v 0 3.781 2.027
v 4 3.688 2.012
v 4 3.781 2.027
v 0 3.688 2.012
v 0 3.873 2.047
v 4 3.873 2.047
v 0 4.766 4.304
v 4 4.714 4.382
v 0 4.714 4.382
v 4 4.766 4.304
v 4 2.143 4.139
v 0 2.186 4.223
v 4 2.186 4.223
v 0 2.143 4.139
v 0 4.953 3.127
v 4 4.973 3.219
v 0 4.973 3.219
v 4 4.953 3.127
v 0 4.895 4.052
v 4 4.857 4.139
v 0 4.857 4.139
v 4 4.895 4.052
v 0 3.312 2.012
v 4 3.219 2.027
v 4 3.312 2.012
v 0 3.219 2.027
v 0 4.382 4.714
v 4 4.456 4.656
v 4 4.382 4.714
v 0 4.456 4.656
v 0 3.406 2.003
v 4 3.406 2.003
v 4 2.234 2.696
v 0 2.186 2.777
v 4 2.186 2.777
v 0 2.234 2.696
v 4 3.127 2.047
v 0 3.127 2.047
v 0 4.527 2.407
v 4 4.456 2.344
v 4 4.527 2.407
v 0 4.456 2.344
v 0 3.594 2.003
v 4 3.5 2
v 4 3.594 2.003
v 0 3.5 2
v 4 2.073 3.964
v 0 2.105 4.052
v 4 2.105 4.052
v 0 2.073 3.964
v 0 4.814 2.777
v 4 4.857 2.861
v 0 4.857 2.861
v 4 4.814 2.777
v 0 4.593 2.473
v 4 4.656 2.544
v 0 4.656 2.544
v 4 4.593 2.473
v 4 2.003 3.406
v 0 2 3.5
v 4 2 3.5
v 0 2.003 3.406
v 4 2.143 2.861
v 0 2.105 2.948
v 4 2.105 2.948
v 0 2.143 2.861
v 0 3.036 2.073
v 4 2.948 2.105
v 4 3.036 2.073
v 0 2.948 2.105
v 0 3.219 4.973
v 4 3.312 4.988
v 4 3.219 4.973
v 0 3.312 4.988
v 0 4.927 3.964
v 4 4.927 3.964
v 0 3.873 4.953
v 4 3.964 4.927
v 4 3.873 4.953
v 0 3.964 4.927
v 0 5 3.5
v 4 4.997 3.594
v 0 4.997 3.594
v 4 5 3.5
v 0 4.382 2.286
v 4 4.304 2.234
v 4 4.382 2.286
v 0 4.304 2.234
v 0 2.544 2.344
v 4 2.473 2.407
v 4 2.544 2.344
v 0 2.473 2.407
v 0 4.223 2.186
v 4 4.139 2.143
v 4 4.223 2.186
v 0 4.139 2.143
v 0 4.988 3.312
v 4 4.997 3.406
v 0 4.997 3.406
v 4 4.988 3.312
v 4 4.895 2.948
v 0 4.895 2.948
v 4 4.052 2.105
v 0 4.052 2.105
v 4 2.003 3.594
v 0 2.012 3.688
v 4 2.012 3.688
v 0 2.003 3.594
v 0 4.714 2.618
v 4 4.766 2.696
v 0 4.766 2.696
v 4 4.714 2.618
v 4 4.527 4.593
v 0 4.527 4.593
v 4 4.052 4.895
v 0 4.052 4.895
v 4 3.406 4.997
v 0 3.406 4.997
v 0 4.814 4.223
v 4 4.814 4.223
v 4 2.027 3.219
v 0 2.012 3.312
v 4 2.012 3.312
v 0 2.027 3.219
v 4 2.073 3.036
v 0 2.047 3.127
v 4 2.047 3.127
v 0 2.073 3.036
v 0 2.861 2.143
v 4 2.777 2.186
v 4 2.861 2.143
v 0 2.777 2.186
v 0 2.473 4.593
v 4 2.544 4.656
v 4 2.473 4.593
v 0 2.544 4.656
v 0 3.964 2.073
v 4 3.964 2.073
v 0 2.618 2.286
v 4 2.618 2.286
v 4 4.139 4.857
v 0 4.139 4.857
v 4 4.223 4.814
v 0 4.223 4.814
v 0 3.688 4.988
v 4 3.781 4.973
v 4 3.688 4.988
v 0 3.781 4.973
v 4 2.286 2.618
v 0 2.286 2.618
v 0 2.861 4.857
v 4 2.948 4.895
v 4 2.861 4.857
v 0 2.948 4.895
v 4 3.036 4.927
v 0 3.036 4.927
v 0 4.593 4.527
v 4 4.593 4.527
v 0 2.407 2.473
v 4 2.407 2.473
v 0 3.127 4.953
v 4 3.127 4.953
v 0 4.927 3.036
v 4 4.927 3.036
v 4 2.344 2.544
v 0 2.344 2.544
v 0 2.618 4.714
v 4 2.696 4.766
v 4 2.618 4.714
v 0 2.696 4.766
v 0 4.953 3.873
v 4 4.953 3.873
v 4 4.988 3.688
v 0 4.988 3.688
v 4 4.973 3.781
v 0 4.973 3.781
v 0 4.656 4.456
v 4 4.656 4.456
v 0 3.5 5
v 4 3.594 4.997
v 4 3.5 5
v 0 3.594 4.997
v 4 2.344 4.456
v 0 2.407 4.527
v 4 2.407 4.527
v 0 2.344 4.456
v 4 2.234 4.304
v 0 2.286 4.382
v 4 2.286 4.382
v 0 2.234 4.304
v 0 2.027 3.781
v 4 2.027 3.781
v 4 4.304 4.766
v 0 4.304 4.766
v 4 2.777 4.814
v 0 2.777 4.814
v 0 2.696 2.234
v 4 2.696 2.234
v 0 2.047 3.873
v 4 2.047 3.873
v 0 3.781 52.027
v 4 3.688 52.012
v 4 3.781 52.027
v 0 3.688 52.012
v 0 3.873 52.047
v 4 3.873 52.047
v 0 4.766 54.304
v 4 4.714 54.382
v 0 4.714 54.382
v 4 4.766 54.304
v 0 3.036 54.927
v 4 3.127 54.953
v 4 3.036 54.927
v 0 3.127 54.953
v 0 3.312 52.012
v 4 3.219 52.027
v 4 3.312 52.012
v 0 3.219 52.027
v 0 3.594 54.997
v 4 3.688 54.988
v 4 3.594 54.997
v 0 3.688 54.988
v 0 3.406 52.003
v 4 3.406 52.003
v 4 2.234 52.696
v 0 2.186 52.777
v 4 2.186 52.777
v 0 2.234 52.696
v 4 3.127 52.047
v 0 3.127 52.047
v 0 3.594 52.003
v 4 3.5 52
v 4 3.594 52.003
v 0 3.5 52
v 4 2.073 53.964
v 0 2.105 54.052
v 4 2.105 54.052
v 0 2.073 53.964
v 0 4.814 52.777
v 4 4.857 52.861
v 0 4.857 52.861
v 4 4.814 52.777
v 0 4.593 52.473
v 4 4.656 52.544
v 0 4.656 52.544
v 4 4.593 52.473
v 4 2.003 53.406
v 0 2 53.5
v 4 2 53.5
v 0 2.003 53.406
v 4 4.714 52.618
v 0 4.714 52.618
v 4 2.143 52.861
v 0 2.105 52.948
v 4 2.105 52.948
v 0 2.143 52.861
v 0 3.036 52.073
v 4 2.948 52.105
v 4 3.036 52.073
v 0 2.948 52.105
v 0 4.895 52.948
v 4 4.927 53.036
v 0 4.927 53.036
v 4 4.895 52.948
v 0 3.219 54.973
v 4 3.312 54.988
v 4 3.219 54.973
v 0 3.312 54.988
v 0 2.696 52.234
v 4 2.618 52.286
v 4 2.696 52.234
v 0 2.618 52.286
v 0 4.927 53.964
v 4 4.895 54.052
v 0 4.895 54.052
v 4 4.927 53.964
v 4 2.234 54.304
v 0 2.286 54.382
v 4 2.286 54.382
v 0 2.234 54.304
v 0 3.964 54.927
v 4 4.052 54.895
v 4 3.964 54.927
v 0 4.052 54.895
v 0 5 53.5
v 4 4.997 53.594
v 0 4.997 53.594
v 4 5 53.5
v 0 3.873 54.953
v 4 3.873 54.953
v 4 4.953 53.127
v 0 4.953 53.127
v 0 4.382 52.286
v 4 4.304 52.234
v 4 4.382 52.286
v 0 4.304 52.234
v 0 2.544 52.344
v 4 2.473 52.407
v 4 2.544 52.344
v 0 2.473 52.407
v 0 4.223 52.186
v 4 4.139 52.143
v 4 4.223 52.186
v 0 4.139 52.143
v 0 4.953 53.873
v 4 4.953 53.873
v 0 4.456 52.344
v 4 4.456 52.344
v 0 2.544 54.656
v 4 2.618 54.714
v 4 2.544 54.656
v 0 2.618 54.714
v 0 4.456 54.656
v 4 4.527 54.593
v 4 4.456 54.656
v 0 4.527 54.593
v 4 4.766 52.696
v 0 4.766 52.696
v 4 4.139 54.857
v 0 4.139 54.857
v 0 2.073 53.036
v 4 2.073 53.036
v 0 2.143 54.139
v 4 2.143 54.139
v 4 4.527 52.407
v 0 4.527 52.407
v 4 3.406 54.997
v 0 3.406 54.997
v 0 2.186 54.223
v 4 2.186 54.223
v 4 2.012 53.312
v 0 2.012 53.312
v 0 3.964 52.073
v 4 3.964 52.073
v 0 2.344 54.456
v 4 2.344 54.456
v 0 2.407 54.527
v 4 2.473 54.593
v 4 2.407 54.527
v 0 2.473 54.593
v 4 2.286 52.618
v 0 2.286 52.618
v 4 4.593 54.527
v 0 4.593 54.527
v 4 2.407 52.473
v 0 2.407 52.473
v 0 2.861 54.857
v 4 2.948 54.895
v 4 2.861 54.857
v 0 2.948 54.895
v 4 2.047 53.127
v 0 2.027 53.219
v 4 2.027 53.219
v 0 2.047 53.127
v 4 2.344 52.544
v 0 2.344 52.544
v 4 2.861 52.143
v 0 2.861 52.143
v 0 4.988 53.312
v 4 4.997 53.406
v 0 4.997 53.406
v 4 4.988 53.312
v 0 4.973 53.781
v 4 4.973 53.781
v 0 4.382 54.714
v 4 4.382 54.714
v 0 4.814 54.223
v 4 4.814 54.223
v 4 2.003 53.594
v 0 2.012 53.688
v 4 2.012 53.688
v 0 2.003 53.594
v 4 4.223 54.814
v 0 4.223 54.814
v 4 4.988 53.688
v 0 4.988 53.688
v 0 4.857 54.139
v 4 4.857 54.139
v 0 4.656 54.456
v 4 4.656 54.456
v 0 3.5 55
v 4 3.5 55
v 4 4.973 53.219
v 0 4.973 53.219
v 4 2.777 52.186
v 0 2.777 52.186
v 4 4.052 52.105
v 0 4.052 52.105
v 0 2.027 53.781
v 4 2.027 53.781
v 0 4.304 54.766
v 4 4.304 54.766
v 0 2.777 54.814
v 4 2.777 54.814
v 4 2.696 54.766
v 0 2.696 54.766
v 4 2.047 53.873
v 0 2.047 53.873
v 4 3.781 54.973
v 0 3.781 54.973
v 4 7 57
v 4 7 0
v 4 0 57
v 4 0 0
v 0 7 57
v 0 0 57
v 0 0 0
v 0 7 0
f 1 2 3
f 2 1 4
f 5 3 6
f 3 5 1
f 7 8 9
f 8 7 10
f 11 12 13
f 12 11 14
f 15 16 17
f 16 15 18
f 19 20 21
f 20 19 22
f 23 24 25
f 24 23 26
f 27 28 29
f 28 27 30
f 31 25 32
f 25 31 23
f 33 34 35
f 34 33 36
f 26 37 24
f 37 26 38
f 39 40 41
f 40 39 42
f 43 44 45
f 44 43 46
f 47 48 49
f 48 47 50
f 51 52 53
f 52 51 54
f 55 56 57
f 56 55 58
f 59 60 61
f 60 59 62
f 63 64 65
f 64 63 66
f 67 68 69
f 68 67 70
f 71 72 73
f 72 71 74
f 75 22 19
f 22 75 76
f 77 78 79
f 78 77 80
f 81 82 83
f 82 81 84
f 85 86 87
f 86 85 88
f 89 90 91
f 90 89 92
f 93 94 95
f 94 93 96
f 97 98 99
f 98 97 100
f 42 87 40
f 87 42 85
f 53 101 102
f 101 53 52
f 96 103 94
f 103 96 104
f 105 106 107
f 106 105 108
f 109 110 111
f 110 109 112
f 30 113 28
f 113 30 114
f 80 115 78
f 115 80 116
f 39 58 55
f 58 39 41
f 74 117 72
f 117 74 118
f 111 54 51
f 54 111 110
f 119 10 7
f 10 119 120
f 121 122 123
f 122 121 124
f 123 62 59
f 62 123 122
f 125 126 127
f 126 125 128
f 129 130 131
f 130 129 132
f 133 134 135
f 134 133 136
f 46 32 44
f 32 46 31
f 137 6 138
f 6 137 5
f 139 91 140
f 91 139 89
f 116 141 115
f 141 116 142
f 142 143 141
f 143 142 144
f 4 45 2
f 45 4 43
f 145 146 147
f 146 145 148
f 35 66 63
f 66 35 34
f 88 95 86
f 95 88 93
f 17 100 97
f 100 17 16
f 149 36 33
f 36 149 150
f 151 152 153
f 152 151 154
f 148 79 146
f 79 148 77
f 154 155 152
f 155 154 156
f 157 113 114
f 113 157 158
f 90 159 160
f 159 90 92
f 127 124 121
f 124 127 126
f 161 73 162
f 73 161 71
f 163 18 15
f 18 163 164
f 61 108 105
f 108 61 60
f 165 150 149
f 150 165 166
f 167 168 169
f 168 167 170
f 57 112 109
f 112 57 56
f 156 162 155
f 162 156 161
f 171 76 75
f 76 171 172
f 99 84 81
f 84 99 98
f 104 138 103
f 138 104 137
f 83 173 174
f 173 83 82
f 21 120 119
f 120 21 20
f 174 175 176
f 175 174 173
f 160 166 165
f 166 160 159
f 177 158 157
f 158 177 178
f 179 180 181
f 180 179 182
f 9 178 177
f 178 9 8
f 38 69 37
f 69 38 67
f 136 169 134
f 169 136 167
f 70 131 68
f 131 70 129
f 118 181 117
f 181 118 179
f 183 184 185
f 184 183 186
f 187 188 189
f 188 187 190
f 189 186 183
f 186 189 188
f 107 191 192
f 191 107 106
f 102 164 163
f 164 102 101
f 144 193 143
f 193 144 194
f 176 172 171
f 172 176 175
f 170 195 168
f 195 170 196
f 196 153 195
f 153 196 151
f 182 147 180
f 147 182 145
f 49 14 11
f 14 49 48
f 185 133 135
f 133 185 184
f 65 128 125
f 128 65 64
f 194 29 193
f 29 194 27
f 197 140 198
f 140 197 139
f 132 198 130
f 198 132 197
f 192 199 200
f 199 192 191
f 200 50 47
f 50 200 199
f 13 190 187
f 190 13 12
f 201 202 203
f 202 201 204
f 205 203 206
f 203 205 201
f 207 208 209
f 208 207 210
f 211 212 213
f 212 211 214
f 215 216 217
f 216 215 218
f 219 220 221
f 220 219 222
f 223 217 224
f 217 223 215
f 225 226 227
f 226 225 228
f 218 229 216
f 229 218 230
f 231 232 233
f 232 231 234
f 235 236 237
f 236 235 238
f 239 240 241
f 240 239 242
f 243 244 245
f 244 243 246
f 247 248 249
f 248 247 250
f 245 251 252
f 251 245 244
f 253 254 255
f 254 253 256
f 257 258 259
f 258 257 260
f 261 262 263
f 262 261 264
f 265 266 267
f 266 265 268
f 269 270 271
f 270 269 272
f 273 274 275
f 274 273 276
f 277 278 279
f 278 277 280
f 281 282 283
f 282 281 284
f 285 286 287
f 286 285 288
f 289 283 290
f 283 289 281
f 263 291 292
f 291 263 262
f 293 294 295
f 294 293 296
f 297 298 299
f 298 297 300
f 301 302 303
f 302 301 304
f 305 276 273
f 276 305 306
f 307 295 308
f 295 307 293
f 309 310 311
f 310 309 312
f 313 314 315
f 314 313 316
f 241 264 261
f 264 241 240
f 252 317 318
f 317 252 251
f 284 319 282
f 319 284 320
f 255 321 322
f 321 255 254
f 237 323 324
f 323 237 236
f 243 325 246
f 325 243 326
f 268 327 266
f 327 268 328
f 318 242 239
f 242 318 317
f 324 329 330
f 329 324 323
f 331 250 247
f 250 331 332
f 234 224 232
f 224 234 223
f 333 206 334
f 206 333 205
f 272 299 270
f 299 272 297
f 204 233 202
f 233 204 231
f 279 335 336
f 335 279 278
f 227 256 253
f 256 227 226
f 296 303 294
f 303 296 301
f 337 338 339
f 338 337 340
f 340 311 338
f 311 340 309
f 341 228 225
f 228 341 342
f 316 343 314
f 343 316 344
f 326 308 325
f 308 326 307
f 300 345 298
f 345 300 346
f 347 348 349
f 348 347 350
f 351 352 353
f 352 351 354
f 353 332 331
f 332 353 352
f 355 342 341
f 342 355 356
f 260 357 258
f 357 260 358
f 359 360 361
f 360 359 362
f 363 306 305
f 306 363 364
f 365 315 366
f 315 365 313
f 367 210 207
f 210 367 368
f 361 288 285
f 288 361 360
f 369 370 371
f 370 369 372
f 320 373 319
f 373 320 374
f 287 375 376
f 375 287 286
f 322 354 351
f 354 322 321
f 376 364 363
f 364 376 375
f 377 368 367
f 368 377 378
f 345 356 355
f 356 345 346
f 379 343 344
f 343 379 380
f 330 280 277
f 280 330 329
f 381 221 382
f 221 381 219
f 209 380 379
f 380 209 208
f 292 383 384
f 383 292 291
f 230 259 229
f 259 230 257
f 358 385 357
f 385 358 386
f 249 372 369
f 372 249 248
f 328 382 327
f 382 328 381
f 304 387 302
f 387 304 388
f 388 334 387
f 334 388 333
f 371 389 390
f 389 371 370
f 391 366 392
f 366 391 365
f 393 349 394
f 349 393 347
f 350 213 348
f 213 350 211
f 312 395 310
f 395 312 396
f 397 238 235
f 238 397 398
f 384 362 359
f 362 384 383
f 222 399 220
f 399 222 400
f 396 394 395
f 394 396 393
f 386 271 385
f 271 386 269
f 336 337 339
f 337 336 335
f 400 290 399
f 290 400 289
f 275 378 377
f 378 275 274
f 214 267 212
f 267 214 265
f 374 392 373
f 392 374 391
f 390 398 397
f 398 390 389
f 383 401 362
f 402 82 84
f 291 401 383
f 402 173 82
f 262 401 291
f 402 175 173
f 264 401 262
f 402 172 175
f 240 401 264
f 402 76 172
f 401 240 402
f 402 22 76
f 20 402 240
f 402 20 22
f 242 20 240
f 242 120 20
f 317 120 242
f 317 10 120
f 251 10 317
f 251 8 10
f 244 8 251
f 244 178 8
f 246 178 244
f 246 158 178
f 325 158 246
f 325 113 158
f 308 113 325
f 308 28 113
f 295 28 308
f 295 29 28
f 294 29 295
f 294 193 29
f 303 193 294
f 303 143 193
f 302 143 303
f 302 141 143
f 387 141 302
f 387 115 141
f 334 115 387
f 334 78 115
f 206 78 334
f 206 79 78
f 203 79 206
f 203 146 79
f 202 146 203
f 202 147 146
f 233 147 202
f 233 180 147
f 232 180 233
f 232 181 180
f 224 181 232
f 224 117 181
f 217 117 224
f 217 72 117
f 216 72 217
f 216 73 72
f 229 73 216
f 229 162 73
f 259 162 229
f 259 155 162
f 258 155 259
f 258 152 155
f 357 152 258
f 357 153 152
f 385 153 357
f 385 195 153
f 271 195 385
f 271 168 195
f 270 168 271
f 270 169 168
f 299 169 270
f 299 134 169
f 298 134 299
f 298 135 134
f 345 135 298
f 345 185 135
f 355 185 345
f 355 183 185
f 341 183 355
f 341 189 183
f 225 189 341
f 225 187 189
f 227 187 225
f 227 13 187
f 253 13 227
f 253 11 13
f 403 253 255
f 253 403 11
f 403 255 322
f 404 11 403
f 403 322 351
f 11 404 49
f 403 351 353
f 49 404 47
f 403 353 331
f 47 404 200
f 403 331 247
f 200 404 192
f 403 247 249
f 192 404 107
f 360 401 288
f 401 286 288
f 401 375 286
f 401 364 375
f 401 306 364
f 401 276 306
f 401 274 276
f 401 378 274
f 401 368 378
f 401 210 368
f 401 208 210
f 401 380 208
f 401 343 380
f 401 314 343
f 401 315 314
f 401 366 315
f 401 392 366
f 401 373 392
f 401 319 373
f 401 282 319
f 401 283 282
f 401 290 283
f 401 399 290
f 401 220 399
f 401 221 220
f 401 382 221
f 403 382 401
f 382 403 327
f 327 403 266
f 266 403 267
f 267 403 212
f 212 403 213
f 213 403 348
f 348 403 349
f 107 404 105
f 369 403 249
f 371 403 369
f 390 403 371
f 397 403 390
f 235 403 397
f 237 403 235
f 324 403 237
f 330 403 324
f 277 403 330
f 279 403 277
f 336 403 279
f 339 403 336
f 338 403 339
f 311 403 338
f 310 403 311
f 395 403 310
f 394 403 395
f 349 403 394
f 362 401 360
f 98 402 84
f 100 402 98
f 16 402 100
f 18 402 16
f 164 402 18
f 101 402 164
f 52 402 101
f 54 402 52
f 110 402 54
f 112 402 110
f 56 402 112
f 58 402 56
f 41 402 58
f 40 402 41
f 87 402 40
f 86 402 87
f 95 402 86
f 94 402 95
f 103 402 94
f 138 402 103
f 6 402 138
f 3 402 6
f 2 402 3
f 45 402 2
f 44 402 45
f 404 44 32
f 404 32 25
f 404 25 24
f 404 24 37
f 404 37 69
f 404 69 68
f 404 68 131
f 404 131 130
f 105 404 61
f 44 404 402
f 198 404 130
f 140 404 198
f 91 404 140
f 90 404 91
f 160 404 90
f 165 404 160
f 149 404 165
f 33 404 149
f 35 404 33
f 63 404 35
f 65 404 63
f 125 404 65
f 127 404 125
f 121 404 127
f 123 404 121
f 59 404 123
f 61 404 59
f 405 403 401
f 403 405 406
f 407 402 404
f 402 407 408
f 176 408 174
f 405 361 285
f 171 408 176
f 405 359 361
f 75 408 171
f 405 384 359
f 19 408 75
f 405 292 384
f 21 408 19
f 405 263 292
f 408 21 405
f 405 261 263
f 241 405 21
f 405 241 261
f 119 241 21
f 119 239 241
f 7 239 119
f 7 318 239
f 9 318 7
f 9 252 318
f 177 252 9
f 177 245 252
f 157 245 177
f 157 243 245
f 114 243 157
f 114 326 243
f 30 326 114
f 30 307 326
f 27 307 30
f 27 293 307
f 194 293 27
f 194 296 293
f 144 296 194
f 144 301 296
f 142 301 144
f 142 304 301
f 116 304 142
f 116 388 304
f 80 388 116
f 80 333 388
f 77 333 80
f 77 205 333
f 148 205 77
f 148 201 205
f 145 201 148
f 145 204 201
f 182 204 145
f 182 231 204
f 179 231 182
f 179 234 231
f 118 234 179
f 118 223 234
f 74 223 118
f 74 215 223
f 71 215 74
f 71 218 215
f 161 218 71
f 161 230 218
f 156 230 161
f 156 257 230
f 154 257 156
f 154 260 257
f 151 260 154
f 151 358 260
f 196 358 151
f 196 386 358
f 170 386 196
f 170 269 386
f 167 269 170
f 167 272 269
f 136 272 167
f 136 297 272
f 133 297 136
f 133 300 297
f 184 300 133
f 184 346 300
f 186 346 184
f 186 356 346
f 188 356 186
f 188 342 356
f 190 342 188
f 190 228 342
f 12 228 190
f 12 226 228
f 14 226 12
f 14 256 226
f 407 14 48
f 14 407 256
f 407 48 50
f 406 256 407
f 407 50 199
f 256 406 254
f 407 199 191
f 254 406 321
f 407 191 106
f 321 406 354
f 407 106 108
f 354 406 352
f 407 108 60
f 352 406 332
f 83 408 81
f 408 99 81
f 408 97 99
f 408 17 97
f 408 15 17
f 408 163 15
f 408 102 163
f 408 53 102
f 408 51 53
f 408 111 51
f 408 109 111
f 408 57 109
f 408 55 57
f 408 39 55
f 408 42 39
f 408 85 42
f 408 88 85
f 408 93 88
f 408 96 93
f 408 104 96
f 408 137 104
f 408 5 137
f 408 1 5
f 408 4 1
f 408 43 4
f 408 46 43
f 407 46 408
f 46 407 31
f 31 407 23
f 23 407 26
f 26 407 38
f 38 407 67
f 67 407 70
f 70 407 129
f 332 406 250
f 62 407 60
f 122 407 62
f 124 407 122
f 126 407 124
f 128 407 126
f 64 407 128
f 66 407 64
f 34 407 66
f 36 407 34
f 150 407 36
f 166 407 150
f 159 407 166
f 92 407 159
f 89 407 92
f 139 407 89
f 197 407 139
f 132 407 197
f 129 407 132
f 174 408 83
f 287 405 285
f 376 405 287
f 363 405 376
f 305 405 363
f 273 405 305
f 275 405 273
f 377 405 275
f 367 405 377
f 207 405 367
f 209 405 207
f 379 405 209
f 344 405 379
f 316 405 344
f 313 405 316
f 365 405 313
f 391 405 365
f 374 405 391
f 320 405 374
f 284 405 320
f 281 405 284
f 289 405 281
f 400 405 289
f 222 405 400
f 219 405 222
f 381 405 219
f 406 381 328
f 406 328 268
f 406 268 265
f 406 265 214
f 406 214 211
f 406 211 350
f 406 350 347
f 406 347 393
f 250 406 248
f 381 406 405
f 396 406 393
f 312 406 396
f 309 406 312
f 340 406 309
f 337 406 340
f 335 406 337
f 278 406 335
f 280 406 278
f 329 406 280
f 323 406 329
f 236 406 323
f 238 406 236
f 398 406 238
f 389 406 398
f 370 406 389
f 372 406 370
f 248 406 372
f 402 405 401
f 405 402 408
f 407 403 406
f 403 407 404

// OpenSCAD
difference(){
	union(){        

        translate([0,0,0]){
           cube([4,7,57], center=false);
        }
        
        
       
        
	}
	union() {

  

        translate([0,3.5,3.5]){
            rotate(a = [0,90,0]) {
                cylinder(h=300, r=1.5, $fn=100, center=true);
            }
        }	
        
        translate([0,3.5,3.5+50]){
            rotate(a = [0,90,0]) {
                cylinder(h=300, r=1.5, $fn=100, center=true);
            }
        }	




	}
}
